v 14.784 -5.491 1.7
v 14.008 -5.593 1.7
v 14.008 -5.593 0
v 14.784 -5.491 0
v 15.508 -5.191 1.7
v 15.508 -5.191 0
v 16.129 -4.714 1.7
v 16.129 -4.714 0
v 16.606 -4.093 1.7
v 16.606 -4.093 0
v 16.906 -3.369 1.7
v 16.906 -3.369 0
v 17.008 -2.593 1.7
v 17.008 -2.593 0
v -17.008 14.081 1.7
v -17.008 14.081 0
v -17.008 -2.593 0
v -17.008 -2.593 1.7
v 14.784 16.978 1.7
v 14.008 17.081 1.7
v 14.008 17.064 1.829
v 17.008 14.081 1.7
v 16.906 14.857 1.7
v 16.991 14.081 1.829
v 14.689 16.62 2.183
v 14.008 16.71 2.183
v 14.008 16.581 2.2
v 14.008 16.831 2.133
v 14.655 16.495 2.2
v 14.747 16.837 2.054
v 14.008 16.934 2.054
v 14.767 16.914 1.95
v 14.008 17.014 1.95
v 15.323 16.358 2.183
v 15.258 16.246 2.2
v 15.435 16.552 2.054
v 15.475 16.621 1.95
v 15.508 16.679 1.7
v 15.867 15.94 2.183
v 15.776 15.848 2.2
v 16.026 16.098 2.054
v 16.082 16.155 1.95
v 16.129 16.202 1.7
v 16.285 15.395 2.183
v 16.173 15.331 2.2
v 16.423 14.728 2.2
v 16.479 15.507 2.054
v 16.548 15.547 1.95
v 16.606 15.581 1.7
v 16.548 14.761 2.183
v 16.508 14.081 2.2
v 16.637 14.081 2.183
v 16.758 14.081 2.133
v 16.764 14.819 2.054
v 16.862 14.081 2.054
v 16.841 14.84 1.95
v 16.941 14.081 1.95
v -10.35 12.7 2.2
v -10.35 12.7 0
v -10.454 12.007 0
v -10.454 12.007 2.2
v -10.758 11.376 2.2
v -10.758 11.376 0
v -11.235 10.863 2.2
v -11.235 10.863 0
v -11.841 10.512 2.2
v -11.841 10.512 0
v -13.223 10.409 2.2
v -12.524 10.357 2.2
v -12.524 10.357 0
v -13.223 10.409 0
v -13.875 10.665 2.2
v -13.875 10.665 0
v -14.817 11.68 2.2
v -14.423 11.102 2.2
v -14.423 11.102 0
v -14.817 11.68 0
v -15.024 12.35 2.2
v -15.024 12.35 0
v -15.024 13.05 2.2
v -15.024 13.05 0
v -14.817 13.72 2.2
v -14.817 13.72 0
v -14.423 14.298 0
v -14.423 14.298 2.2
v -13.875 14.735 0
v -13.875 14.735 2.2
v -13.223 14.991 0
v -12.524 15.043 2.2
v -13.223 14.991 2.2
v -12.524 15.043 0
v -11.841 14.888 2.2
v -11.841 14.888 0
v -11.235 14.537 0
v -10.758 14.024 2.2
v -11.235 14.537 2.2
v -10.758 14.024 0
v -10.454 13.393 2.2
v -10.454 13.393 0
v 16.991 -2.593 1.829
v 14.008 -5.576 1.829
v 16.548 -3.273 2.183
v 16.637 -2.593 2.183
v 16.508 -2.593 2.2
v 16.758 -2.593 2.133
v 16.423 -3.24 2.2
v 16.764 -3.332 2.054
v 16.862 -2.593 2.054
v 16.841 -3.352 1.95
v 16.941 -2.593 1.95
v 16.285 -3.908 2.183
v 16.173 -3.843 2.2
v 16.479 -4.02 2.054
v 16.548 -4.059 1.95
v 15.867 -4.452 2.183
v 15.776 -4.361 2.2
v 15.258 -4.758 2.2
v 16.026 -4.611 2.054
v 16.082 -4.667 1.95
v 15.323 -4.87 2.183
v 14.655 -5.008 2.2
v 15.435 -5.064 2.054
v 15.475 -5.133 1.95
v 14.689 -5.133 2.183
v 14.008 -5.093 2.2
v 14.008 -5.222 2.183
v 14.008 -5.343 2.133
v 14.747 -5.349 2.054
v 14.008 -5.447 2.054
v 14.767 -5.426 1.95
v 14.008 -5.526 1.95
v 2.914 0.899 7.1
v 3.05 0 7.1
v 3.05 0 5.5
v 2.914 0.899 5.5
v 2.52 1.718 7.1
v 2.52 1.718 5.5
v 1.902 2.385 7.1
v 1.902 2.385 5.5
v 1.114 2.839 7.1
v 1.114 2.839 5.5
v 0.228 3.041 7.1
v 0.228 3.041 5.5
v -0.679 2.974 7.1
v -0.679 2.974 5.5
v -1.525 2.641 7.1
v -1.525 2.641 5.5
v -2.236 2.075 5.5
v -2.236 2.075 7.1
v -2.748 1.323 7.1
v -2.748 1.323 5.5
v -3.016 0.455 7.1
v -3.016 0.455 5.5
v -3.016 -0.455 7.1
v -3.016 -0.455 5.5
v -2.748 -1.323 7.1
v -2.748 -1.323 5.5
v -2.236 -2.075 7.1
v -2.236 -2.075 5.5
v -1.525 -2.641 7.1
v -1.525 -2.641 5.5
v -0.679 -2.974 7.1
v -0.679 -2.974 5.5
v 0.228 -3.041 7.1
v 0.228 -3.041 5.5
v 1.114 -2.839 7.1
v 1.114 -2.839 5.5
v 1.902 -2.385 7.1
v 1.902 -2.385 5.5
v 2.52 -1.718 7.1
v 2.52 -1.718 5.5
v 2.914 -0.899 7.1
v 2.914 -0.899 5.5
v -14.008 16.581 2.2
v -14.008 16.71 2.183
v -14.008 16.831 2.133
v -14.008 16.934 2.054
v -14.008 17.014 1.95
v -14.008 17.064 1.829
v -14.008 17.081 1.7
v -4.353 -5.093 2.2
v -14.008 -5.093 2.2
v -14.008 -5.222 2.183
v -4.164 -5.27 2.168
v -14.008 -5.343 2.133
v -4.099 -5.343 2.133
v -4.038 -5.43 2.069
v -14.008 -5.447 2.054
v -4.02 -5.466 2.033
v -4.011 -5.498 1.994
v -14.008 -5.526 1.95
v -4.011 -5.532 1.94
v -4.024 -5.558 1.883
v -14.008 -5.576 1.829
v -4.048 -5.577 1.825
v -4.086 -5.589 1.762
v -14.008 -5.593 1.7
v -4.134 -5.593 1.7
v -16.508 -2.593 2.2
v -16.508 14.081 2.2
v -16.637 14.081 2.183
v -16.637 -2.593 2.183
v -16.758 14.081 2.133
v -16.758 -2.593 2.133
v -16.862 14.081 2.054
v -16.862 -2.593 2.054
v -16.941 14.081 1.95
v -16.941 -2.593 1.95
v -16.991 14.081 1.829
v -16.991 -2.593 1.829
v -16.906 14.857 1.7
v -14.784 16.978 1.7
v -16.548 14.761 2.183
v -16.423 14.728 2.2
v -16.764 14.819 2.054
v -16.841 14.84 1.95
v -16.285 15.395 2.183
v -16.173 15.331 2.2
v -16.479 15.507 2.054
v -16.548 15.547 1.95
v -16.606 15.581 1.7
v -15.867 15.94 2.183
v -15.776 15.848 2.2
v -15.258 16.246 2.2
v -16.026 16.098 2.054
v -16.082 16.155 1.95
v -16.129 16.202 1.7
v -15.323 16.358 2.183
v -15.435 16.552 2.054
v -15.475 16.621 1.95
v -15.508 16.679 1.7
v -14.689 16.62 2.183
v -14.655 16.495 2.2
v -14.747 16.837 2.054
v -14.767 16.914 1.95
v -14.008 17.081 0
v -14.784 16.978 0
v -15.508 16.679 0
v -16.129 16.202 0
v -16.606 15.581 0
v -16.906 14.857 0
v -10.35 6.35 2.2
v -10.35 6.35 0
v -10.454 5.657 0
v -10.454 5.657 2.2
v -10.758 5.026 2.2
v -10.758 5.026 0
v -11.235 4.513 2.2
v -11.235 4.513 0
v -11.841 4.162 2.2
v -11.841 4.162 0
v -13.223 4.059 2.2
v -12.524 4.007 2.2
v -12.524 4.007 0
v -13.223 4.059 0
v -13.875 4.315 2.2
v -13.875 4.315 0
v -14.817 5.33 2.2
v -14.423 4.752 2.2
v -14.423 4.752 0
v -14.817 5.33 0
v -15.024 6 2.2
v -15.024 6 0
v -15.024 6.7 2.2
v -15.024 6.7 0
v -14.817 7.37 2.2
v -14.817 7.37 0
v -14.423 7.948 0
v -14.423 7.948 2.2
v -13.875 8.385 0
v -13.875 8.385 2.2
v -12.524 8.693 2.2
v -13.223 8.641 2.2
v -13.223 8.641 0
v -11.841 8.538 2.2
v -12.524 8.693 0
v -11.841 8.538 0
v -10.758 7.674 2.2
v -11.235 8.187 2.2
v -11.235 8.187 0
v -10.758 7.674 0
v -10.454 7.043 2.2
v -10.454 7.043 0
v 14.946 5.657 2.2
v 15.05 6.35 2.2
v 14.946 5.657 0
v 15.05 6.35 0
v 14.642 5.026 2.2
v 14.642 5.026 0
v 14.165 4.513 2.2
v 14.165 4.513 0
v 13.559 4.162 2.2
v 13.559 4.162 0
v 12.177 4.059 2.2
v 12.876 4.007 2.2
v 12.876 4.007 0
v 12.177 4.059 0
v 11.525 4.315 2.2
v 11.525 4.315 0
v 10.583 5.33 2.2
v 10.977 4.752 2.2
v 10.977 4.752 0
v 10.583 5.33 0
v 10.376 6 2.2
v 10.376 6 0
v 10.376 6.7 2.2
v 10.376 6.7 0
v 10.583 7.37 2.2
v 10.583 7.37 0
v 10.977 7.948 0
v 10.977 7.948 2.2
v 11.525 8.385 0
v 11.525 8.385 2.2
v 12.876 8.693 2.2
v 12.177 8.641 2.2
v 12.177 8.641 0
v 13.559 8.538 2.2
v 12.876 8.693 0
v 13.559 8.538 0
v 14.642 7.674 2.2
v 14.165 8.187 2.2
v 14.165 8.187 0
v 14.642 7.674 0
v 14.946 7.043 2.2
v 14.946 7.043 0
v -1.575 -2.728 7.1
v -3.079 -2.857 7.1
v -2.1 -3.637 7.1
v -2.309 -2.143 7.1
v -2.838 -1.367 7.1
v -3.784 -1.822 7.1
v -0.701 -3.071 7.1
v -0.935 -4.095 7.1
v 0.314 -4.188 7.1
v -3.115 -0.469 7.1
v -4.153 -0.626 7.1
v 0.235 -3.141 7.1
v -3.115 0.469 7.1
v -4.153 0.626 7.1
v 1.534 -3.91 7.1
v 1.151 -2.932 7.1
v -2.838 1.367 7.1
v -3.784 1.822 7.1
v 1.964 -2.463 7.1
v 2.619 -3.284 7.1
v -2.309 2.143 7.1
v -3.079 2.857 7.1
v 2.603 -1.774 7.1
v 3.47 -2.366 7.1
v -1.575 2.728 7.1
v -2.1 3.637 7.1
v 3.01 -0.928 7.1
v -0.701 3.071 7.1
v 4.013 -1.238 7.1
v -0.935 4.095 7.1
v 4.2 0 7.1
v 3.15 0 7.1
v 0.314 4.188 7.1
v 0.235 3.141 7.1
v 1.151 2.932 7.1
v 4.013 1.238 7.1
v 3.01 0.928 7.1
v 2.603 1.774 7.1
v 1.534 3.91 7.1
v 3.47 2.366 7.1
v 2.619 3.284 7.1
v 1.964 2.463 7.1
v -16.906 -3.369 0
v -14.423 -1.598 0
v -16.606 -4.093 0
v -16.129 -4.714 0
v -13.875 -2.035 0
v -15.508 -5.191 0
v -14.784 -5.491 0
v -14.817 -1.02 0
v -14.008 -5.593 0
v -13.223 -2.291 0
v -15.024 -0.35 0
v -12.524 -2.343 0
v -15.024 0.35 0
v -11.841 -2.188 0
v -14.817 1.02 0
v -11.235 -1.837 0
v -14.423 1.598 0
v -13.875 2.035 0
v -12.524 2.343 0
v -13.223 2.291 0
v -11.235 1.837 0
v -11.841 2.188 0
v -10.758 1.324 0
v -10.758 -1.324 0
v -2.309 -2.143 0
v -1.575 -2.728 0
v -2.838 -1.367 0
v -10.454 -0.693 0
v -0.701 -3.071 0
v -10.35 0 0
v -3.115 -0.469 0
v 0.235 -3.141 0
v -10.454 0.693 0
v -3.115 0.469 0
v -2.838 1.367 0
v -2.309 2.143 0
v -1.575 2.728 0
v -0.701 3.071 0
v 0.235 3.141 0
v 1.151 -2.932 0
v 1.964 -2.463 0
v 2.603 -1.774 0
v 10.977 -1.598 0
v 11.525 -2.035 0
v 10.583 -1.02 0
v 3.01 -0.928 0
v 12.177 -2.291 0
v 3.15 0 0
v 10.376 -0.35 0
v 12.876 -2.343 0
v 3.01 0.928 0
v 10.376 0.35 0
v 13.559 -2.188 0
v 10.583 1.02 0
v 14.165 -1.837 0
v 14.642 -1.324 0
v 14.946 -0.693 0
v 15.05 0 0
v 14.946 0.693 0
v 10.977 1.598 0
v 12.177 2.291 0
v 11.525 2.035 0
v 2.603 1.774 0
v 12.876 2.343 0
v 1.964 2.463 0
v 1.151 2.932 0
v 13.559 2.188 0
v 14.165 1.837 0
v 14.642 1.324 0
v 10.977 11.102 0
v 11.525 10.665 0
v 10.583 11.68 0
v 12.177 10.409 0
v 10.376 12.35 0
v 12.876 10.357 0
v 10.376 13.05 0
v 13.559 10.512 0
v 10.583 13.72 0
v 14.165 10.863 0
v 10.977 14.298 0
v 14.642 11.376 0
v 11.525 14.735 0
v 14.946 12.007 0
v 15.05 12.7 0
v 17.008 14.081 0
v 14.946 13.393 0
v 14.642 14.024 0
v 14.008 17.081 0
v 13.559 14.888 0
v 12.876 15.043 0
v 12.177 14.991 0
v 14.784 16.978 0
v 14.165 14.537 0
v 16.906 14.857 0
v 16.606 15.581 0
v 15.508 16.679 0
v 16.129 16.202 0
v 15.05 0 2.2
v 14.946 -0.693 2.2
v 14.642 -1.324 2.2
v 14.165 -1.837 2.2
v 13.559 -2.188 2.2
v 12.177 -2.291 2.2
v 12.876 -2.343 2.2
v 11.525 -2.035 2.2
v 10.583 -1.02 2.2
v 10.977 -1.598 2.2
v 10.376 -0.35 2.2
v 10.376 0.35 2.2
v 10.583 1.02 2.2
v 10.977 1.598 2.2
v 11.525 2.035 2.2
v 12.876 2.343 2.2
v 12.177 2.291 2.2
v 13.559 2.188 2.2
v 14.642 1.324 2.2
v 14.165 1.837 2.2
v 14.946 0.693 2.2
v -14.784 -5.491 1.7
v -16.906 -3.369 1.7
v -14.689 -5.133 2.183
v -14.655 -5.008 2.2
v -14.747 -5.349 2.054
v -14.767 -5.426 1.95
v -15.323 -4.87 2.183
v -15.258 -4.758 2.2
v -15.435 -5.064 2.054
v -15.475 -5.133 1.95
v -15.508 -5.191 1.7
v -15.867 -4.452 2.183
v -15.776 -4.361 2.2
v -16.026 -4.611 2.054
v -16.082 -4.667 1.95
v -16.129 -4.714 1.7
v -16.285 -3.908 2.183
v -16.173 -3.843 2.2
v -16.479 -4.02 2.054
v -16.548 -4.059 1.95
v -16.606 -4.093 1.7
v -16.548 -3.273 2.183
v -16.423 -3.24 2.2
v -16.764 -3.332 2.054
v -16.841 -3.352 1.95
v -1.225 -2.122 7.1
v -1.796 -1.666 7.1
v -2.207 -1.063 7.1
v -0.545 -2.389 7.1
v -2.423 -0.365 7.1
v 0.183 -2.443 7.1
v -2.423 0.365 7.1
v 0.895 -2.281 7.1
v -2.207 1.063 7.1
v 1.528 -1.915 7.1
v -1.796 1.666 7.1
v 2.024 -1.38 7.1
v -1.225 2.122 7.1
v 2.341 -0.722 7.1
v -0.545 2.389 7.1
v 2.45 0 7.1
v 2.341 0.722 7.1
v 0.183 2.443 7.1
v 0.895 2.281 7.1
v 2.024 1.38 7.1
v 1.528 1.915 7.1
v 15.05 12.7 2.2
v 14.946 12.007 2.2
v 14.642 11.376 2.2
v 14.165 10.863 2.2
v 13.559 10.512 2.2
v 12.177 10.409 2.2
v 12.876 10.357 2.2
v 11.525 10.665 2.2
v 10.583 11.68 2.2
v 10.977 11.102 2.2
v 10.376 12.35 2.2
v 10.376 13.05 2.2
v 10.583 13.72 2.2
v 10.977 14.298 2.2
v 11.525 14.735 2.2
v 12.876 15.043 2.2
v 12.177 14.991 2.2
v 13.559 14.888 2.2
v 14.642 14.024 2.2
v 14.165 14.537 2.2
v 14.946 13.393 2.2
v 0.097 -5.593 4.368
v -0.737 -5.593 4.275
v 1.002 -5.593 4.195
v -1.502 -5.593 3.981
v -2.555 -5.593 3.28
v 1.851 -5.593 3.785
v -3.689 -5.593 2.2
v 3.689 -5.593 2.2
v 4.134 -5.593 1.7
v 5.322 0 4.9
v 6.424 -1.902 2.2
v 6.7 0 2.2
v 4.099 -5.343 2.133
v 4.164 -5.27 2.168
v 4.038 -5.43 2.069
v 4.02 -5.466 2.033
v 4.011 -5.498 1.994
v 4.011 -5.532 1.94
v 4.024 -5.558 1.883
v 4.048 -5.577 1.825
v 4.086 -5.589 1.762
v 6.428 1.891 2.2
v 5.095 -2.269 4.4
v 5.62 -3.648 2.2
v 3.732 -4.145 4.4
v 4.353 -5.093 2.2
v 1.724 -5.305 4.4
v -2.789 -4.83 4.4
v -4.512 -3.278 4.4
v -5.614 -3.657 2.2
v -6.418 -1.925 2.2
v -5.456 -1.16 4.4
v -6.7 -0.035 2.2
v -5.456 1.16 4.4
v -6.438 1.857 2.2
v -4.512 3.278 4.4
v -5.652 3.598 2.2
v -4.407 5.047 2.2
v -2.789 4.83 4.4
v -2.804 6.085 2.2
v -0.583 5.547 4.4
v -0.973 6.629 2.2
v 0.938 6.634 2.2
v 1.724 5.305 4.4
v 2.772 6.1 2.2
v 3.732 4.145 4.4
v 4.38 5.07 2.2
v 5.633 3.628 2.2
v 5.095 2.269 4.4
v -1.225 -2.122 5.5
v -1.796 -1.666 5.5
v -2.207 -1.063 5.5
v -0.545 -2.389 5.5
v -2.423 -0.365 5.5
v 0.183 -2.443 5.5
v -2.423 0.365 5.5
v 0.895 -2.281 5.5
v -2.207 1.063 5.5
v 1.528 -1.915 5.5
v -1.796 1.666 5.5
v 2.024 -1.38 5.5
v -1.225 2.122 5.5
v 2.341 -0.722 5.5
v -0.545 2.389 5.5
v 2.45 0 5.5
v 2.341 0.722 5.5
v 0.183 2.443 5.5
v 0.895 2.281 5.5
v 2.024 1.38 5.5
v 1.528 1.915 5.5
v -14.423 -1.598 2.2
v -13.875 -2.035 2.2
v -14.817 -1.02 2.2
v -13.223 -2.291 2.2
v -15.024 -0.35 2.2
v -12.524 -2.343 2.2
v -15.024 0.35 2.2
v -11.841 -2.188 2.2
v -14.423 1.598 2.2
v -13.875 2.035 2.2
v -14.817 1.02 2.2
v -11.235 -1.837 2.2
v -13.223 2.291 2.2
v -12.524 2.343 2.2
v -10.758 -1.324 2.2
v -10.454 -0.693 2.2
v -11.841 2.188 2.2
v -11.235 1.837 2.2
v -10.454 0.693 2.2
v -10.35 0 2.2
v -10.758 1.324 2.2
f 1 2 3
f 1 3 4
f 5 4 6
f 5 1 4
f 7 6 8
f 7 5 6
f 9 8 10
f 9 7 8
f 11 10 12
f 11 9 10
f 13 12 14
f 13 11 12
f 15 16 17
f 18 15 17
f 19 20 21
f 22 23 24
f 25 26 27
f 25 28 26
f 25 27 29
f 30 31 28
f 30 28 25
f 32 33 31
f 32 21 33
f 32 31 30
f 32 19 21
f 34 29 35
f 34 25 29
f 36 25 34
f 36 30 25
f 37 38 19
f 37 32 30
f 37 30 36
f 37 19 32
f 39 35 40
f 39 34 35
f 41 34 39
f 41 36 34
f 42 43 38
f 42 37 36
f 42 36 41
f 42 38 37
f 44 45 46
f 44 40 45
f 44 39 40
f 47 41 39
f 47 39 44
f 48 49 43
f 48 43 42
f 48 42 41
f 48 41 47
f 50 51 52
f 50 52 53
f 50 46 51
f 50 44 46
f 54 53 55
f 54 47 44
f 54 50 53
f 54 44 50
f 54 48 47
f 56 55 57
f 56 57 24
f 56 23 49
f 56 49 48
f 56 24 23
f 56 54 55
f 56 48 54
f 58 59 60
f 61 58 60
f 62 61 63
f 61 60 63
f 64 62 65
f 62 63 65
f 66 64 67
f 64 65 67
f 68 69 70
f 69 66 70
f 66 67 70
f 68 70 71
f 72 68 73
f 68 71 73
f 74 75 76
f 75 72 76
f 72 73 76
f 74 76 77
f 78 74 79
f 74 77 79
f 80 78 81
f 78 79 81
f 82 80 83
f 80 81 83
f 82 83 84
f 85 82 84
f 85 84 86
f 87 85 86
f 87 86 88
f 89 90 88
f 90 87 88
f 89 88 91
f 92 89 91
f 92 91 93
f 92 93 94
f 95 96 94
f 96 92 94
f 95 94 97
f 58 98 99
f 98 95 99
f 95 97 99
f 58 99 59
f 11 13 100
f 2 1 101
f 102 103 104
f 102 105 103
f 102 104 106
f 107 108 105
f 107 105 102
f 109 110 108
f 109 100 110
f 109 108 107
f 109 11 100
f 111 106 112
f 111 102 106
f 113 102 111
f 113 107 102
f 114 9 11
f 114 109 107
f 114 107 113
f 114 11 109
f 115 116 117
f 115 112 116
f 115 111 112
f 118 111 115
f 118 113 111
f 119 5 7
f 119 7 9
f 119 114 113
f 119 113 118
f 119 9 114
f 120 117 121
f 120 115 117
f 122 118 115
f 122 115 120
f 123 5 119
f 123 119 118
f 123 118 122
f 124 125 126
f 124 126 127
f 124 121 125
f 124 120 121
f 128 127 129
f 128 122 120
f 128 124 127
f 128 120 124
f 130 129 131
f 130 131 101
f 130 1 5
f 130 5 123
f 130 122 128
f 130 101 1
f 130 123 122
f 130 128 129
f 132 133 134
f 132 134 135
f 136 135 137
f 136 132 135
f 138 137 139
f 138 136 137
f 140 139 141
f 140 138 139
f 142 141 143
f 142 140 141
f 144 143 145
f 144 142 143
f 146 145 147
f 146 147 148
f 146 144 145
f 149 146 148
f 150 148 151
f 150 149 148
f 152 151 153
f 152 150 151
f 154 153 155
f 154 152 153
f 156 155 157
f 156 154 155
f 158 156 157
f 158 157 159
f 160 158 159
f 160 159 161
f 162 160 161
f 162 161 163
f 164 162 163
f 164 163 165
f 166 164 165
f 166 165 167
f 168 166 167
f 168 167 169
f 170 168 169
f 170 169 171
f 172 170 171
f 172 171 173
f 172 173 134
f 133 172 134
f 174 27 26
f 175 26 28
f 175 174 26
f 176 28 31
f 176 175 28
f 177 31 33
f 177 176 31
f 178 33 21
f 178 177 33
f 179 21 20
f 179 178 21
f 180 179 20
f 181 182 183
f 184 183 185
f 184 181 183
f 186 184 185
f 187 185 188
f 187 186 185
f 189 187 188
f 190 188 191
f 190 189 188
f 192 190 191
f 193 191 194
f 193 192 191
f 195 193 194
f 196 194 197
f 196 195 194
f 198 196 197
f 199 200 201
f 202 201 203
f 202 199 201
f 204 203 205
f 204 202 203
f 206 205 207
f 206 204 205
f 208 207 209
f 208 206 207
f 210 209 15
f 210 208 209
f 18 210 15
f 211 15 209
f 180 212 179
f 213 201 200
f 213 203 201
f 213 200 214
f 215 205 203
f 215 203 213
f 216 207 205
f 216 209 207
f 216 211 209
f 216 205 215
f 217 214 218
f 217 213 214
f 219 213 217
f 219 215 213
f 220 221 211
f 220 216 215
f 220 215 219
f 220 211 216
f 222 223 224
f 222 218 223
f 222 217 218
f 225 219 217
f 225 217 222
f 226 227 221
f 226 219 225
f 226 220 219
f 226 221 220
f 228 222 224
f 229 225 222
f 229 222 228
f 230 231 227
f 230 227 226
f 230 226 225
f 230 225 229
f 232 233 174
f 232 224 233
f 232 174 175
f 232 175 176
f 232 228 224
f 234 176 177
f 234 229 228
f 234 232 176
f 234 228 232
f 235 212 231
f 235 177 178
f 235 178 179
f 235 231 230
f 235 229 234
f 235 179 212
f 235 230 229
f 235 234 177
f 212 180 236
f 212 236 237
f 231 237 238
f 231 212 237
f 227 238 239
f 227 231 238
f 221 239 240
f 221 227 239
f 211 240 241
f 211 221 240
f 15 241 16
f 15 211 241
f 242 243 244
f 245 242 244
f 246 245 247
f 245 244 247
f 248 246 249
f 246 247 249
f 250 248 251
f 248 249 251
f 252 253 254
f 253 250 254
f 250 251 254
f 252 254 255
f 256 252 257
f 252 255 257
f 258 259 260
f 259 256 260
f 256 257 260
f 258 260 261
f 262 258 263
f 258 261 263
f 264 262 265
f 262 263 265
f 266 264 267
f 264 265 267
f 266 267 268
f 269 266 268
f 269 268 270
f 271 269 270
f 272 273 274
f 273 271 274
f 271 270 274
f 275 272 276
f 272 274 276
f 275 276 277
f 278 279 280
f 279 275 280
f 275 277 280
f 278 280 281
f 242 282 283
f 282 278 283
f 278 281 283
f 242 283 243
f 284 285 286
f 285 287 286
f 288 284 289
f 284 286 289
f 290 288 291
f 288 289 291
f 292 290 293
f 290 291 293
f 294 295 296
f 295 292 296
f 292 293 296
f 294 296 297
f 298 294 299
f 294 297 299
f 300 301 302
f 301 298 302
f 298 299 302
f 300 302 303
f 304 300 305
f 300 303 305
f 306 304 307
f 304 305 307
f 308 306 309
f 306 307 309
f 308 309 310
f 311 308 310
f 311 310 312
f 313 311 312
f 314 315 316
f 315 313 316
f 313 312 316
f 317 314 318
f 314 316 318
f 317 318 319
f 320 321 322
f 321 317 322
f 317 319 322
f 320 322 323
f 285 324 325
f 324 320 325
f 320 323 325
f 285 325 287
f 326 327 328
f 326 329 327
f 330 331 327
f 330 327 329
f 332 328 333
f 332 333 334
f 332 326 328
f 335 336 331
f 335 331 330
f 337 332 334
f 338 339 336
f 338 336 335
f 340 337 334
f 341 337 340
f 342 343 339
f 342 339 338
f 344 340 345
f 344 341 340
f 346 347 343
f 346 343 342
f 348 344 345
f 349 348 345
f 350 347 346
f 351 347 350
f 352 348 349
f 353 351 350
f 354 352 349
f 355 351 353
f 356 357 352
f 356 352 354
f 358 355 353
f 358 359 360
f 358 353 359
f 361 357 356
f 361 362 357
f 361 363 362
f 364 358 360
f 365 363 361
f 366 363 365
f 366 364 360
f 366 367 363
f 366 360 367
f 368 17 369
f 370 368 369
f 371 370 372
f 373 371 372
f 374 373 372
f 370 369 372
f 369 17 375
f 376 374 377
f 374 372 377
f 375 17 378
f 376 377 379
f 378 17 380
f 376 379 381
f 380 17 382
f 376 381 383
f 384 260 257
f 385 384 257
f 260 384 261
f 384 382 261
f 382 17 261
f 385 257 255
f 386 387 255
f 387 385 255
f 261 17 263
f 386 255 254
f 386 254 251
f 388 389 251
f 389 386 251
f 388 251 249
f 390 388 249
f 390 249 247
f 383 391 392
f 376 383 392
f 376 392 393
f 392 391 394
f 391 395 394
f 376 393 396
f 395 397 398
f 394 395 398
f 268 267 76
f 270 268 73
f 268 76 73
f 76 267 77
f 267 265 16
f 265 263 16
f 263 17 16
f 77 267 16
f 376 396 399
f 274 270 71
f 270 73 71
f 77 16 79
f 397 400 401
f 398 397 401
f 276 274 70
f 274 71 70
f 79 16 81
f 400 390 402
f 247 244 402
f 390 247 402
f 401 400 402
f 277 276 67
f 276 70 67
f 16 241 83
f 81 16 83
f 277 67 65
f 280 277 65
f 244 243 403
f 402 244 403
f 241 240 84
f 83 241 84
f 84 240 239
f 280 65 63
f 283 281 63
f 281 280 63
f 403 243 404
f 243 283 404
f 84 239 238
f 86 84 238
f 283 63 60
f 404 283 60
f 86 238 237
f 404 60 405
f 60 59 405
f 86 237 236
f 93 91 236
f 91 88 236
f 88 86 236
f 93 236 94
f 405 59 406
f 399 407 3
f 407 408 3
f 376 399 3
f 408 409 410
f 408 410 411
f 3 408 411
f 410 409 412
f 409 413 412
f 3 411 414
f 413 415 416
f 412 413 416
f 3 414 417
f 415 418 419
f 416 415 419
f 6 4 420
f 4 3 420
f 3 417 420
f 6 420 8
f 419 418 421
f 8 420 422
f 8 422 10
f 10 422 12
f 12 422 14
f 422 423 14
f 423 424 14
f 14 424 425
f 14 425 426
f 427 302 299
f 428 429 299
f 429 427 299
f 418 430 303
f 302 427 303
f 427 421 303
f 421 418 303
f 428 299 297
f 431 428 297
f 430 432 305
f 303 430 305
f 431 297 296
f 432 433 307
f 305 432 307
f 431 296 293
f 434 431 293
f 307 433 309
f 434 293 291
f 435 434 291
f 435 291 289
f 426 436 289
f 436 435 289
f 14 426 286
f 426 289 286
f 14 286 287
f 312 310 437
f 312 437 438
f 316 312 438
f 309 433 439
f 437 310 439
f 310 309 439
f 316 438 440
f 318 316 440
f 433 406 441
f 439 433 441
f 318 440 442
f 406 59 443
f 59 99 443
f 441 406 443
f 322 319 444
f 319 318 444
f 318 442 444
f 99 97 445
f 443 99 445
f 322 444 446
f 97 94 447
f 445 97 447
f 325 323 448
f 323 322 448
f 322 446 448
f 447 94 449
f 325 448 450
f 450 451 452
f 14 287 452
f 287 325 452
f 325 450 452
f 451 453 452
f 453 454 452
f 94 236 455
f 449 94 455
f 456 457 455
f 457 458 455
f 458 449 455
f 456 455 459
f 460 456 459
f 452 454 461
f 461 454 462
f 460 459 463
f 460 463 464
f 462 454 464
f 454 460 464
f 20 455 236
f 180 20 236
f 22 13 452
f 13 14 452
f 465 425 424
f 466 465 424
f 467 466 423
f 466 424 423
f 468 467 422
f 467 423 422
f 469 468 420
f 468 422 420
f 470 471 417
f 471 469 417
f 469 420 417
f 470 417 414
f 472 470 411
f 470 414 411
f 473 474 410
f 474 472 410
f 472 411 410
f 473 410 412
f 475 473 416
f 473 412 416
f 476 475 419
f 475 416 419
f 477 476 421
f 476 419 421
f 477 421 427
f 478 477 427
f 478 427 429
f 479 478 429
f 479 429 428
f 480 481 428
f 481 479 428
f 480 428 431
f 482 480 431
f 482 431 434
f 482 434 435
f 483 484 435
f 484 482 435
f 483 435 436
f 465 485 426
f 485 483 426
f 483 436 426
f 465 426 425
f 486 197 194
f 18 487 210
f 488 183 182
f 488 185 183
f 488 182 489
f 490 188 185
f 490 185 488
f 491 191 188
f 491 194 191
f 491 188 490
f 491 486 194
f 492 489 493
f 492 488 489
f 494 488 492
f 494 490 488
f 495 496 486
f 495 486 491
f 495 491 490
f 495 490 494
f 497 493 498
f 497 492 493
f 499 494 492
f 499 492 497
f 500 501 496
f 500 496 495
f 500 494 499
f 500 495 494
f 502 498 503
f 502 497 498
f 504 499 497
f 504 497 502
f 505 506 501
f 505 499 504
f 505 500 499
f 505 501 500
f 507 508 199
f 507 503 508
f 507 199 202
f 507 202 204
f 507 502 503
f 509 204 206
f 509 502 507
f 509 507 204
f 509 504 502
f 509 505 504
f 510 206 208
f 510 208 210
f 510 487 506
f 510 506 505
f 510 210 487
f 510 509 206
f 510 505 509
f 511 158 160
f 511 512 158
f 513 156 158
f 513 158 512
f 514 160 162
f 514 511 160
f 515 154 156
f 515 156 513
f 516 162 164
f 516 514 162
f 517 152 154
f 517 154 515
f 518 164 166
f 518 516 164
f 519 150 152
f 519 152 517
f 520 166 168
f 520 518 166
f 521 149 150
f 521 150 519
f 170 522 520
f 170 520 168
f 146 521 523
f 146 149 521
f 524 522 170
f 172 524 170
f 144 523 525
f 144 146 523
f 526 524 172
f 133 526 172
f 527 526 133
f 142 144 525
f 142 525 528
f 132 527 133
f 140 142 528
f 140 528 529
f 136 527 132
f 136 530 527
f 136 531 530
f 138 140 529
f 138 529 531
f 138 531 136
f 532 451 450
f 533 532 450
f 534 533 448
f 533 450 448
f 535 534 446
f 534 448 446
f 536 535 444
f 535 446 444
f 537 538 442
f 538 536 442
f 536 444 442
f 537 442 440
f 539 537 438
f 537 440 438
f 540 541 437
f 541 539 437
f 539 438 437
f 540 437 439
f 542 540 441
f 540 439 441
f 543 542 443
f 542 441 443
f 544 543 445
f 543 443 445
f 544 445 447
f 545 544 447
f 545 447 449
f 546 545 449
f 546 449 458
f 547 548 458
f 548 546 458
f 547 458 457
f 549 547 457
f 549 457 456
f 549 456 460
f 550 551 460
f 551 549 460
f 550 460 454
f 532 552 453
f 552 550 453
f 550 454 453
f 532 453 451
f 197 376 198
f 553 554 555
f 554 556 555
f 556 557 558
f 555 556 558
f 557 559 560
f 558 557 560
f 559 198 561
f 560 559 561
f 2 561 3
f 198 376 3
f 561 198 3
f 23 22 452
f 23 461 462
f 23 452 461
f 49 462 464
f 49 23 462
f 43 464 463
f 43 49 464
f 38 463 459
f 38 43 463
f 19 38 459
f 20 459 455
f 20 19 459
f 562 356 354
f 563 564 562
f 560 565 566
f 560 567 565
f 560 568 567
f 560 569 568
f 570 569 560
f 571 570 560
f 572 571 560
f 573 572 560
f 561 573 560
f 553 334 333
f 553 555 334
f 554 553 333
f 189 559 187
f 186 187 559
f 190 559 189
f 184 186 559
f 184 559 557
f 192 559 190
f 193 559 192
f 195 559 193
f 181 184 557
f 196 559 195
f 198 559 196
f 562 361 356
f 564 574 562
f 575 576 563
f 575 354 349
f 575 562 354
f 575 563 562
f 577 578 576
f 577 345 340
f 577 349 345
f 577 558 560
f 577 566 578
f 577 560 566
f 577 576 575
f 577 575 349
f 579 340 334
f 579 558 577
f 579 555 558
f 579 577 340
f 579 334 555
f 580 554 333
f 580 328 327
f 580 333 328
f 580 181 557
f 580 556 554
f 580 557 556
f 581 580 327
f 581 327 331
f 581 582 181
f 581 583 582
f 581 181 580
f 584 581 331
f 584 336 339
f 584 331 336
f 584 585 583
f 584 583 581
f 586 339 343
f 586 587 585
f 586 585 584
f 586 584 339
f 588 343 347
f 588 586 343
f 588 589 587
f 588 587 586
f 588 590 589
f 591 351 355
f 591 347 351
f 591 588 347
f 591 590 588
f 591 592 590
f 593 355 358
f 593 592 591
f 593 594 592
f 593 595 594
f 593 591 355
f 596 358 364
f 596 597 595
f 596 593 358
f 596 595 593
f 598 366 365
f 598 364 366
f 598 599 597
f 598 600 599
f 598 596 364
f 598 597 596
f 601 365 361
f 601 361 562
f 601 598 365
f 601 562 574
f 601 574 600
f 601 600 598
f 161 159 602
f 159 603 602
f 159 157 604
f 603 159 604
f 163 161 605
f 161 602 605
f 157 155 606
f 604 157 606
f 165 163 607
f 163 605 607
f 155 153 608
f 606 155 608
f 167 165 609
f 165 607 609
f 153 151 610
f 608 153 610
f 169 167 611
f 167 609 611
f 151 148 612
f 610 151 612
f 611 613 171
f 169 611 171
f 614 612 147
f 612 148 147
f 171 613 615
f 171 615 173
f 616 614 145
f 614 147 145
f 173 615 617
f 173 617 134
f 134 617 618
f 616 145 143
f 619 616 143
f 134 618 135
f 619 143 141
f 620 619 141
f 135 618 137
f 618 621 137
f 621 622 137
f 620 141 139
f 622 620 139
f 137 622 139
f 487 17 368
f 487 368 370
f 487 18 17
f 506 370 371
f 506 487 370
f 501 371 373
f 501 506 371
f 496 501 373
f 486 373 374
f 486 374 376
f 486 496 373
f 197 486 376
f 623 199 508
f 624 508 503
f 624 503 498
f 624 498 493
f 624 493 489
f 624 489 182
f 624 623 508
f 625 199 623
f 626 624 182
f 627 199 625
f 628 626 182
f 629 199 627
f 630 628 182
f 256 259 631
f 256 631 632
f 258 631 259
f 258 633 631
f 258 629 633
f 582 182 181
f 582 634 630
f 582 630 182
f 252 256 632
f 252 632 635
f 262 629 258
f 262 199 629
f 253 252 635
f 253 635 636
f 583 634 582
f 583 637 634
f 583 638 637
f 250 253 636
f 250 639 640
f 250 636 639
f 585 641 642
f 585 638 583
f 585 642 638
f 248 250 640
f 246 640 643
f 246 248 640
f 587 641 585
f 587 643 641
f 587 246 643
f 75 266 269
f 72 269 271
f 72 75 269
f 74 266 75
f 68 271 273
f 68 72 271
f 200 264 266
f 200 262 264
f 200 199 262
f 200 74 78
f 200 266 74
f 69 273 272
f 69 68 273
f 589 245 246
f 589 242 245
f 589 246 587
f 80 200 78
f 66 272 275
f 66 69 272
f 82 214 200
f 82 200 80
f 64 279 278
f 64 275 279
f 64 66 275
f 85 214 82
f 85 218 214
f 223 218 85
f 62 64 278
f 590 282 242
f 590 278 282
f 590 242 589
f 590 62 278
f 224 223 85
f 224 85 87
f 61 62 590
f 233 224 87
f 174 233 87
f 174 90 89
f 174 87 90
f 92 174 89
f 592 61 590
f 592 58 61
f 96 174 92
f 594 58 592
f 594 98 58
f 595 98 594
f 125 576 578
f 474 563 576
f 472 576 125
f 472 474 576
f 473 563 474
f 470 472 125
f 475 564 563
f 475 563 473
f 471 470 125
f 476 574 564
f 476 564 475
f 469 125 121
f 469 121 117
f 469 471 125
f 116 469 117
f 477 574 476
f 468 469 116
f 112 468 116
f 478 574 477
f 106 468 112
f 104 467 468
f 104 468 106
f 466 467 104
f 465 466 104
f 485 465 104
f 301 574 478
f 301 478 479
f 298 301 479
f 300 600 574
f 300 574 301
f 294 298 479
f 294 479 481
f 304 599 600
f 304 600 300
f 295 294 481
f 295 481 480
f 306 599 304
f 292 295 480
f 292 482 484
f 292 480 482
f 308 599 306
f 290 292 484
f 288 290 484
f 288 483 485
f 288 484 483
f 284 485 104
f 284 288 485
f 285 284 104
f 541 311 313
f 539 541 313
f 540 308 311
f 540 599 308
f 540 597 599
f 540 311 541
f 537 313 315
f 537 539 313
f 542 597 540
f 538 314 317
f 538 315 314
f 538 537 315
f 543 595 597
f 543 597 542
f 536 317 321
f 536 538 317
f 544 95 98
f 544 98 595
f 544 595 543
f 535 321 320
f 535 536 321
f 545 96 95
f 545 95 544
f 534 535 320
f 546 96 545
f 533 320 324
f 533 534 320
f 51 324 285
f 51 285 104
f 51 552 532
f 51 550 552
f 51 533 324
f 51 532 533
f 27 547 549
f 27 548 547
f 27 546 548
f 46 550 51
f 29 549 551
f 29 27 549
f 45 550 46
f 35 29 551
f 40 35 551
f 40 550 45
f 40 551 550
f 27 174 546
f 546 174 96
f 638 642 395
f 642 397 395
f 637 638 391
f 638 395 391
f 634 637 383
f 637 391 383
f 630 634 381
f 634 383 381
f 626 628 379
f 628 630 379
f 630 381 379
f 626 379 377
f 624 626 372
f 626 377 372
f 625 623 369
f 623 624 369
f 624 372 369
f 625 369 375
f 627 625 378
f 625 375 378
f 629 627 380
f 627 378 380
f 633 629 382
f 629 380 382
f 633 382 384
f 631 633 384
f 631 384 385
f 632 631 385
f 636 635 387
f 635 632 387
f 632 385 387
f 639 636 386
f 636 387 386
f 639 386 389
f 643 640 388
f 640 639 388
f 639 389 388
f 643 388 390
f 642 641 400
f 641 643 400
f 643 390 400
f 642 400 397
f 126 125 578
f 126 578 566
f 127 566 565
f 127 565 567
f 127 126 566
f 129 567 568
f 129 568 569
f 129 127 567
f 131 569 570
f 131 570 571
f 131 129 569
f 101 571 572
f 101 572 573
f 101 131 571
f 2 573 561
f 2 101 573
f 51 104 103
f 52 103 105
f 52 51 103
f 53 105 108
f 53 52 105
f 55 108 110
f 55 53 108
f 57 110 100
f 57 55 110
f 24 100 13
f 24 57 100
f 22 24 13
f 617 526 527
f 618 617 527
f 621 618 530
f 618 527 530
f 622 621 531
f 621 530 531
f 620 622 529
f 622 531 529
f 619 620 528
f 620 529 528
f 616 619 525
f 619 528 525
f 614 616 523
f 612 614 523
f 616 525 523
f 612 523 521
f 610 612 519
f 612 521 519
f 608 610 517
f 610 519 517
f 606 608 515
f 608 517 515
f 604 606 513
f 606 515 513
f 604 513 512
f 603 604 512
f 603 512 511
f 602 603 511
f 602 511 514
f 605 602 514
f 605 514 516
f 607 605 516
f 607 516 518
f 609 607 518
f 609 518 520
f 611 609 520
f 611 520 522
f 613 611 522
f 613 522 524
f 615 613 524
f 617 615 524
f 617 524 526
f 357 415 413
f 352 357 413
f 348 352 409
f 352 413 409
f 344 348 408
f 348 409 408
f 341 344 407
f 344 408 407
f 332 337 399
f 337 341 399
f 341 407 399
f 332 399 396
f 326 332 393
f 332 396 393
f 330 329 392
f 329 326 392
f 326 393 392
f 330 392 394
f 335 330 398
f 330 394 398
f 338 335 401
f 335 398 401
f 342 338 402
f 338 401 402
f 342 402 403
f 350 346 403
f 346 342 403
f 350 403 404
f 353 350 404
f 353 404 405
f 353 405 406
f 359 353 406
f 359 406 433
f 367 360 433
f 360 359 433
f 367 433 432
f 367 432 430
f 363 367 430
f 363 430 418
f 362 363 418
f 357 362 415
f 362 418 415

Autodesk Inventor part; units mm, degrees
ref_plane "YZ Plane" through (0, 0, 0) normal (1, 0, 0) x (0, 1, 0)
ref_plane "XZ Plane" through (0, 0, 0) normal (0, 1, 0) x (-1, 0, 0)
ref_plane "XY Plane" through (0, 0, 0) normal (0, 0, 1) x (1, 0, 0)
sketch "Sketch1" plane through (0, 0, 0) normal (0, 0, 1) x (1, 0, 0)
  circle A0 centre (0, 0) radius 3.15
  line L0 (0, 0) -> (12.7, 0) construction
  circle A1 centre (12.7, 0) radius 2.35
  line L1 (0, 0) -> (0, 14.467027) construction
  circle A2 centre (12.7, 6.35) radius 2.35
  circle A3 centre (12.7, 12.7) radius 2.35
  line L2 (0, -10.866161) -> (0, 17.080603) construction
  line L3 (0, 17.080603) -> (17.008013, 17.080603) construction
  line L4 (17.008013, 17.080603) -> (17.008013, -10.866161) construction
  line L5 (17.008013, -10.866161) -> (0, -10.866161) construction
  line L6 (0, 17.080603) -> (17.008013, 17.080603)
  line L7 (17.008013, 17.080603) -> (17.008013, -5.592949)
  line L8 (17.008013, -5.592949) -> (0, -5.592949)
  line L9 (0, -5.592949) -> (0, 17.080603)
  line L10 (0, 17.080603) -> (-17.008013, 17.080603) construction
  line L11 (0, 17.080603) -> (-17.008013, 17.080603)
  line L12 (-17.008013, -5.592949) -> (0, -5.592949)
  circle A4 centre (-12.7, 0) radius 2.35
  circle A5 centre (-12.7, 6.35) radius 2.35
  circle A6 centre (-12.7, 12.7) radius 2.35
  line L13 (-17.008013, 17.080603) -> (-17.008013, -5.592949)
  circle A7 centre (0, 0) radius 5.592949
  circle A8 centre (0, 0) radius 4.2
  dimension "d0" = 6.3
  dimension "d1" = 12.7
  dimension "d2" = 4.7
  dimension "d5" = 6.35
  dimension "d12" = 8.4
sketch "Sketch1 outline for Extrusion1" plane through (0, 0, 0) normal (0, 0, 1) x (1, 0, 0)
  line L0 (0, 17.080603) -> (-17.008013, 17.080603)
  line L1 (17.008013, 17.080603) -> (0, 17.080603)
  line L2 (-17.008013, 17.080603) -> (-17.008013, -5.592949)
  line L3 (17.008013, -5.592949) -> (17.008013, 17.080603)
  line L4 (-17.008013, -5.592949) -> (0, -5.592949)
  line L5 (0, -5.592949) -> (17.008013, -5.592949)
  circle A0 centre (-12.7, 0) radius 2.35
  circle A1 centre (0, 0) radius 3.15
  circle A2 centre (12.7, 0) radius 2.35
  circle A3 centre (-12.7, 6.35) radius 2.35
  circle A4 centre (-12.7, 12.7) radius 2.35
  circle A5 centre (12.7, 6.35) radius 2.35
  circle A6 centre (12.7, 12.7) radius 2.35
extrude "Extrusion1" add sketch "Sketch1 outline for Extrusion1" along normal blind 2.2
sketch "Sketch1 outline for Extrusion3" plane through (0, 0, 0) normal (0, 0, 1) x (1, 0, 0)
  circle A0 centre (0, 0) radius 4.2
  circle A1 centre (0, 0) radius 3.15
extrude "Extrusion3" add sketch "Sketch1 outline for Extrusion3" along normal blind 7.1
chamfer "Chamfer1" distance 2.5 distance2 4.9 1 edges at (-4.2, 0, 2.2)
sketch "Sketch2" plane through (0, 0, 7.1) normal (0, 0, 1) x (1, 0, 0)
  circle A0 centre (0, 0) radius 2.45
  circle A1 centre (0, 0) radius 3.05
  dimension "d20" = 4.9
sketch "Sketch2 outline for Extrusion4" plane through (0, 0, 7.1) normal (0, 0, 1) x (1, 0, 0)
  circle A0 centre (0, 0) radius 3.05
  circle A1 centre (0, 0) radius 2.45
extrude "Extrusion4" add sketch "Sketch2 outline for Extrusion4" against normal blind 1.6
fillet "Fillet1" radius 3 4 edges at (-17.008, -5.5929, 1.1) (17.008, -5.5929, 1.1) (17.008, 17.0806, 1.1) (-17.008, 17.0806, 1.1)
fillet "Fillet2" radius 0.5 8 edges at (-16.1293, 16.2019, 2.2) (-17.008, 5.7438, 2.2) (-16.1293, -4.7143, 2.2) (8.8485, -5.5929, 2.2) (16.1293, 16.2019, 2.2) (17.008, 5.7438, 2.2) (16.1293, -4.7143, 2.2) (0, 17.0806, 2.2)
properties part number "RevMagnetHolder-1inchmounts"
